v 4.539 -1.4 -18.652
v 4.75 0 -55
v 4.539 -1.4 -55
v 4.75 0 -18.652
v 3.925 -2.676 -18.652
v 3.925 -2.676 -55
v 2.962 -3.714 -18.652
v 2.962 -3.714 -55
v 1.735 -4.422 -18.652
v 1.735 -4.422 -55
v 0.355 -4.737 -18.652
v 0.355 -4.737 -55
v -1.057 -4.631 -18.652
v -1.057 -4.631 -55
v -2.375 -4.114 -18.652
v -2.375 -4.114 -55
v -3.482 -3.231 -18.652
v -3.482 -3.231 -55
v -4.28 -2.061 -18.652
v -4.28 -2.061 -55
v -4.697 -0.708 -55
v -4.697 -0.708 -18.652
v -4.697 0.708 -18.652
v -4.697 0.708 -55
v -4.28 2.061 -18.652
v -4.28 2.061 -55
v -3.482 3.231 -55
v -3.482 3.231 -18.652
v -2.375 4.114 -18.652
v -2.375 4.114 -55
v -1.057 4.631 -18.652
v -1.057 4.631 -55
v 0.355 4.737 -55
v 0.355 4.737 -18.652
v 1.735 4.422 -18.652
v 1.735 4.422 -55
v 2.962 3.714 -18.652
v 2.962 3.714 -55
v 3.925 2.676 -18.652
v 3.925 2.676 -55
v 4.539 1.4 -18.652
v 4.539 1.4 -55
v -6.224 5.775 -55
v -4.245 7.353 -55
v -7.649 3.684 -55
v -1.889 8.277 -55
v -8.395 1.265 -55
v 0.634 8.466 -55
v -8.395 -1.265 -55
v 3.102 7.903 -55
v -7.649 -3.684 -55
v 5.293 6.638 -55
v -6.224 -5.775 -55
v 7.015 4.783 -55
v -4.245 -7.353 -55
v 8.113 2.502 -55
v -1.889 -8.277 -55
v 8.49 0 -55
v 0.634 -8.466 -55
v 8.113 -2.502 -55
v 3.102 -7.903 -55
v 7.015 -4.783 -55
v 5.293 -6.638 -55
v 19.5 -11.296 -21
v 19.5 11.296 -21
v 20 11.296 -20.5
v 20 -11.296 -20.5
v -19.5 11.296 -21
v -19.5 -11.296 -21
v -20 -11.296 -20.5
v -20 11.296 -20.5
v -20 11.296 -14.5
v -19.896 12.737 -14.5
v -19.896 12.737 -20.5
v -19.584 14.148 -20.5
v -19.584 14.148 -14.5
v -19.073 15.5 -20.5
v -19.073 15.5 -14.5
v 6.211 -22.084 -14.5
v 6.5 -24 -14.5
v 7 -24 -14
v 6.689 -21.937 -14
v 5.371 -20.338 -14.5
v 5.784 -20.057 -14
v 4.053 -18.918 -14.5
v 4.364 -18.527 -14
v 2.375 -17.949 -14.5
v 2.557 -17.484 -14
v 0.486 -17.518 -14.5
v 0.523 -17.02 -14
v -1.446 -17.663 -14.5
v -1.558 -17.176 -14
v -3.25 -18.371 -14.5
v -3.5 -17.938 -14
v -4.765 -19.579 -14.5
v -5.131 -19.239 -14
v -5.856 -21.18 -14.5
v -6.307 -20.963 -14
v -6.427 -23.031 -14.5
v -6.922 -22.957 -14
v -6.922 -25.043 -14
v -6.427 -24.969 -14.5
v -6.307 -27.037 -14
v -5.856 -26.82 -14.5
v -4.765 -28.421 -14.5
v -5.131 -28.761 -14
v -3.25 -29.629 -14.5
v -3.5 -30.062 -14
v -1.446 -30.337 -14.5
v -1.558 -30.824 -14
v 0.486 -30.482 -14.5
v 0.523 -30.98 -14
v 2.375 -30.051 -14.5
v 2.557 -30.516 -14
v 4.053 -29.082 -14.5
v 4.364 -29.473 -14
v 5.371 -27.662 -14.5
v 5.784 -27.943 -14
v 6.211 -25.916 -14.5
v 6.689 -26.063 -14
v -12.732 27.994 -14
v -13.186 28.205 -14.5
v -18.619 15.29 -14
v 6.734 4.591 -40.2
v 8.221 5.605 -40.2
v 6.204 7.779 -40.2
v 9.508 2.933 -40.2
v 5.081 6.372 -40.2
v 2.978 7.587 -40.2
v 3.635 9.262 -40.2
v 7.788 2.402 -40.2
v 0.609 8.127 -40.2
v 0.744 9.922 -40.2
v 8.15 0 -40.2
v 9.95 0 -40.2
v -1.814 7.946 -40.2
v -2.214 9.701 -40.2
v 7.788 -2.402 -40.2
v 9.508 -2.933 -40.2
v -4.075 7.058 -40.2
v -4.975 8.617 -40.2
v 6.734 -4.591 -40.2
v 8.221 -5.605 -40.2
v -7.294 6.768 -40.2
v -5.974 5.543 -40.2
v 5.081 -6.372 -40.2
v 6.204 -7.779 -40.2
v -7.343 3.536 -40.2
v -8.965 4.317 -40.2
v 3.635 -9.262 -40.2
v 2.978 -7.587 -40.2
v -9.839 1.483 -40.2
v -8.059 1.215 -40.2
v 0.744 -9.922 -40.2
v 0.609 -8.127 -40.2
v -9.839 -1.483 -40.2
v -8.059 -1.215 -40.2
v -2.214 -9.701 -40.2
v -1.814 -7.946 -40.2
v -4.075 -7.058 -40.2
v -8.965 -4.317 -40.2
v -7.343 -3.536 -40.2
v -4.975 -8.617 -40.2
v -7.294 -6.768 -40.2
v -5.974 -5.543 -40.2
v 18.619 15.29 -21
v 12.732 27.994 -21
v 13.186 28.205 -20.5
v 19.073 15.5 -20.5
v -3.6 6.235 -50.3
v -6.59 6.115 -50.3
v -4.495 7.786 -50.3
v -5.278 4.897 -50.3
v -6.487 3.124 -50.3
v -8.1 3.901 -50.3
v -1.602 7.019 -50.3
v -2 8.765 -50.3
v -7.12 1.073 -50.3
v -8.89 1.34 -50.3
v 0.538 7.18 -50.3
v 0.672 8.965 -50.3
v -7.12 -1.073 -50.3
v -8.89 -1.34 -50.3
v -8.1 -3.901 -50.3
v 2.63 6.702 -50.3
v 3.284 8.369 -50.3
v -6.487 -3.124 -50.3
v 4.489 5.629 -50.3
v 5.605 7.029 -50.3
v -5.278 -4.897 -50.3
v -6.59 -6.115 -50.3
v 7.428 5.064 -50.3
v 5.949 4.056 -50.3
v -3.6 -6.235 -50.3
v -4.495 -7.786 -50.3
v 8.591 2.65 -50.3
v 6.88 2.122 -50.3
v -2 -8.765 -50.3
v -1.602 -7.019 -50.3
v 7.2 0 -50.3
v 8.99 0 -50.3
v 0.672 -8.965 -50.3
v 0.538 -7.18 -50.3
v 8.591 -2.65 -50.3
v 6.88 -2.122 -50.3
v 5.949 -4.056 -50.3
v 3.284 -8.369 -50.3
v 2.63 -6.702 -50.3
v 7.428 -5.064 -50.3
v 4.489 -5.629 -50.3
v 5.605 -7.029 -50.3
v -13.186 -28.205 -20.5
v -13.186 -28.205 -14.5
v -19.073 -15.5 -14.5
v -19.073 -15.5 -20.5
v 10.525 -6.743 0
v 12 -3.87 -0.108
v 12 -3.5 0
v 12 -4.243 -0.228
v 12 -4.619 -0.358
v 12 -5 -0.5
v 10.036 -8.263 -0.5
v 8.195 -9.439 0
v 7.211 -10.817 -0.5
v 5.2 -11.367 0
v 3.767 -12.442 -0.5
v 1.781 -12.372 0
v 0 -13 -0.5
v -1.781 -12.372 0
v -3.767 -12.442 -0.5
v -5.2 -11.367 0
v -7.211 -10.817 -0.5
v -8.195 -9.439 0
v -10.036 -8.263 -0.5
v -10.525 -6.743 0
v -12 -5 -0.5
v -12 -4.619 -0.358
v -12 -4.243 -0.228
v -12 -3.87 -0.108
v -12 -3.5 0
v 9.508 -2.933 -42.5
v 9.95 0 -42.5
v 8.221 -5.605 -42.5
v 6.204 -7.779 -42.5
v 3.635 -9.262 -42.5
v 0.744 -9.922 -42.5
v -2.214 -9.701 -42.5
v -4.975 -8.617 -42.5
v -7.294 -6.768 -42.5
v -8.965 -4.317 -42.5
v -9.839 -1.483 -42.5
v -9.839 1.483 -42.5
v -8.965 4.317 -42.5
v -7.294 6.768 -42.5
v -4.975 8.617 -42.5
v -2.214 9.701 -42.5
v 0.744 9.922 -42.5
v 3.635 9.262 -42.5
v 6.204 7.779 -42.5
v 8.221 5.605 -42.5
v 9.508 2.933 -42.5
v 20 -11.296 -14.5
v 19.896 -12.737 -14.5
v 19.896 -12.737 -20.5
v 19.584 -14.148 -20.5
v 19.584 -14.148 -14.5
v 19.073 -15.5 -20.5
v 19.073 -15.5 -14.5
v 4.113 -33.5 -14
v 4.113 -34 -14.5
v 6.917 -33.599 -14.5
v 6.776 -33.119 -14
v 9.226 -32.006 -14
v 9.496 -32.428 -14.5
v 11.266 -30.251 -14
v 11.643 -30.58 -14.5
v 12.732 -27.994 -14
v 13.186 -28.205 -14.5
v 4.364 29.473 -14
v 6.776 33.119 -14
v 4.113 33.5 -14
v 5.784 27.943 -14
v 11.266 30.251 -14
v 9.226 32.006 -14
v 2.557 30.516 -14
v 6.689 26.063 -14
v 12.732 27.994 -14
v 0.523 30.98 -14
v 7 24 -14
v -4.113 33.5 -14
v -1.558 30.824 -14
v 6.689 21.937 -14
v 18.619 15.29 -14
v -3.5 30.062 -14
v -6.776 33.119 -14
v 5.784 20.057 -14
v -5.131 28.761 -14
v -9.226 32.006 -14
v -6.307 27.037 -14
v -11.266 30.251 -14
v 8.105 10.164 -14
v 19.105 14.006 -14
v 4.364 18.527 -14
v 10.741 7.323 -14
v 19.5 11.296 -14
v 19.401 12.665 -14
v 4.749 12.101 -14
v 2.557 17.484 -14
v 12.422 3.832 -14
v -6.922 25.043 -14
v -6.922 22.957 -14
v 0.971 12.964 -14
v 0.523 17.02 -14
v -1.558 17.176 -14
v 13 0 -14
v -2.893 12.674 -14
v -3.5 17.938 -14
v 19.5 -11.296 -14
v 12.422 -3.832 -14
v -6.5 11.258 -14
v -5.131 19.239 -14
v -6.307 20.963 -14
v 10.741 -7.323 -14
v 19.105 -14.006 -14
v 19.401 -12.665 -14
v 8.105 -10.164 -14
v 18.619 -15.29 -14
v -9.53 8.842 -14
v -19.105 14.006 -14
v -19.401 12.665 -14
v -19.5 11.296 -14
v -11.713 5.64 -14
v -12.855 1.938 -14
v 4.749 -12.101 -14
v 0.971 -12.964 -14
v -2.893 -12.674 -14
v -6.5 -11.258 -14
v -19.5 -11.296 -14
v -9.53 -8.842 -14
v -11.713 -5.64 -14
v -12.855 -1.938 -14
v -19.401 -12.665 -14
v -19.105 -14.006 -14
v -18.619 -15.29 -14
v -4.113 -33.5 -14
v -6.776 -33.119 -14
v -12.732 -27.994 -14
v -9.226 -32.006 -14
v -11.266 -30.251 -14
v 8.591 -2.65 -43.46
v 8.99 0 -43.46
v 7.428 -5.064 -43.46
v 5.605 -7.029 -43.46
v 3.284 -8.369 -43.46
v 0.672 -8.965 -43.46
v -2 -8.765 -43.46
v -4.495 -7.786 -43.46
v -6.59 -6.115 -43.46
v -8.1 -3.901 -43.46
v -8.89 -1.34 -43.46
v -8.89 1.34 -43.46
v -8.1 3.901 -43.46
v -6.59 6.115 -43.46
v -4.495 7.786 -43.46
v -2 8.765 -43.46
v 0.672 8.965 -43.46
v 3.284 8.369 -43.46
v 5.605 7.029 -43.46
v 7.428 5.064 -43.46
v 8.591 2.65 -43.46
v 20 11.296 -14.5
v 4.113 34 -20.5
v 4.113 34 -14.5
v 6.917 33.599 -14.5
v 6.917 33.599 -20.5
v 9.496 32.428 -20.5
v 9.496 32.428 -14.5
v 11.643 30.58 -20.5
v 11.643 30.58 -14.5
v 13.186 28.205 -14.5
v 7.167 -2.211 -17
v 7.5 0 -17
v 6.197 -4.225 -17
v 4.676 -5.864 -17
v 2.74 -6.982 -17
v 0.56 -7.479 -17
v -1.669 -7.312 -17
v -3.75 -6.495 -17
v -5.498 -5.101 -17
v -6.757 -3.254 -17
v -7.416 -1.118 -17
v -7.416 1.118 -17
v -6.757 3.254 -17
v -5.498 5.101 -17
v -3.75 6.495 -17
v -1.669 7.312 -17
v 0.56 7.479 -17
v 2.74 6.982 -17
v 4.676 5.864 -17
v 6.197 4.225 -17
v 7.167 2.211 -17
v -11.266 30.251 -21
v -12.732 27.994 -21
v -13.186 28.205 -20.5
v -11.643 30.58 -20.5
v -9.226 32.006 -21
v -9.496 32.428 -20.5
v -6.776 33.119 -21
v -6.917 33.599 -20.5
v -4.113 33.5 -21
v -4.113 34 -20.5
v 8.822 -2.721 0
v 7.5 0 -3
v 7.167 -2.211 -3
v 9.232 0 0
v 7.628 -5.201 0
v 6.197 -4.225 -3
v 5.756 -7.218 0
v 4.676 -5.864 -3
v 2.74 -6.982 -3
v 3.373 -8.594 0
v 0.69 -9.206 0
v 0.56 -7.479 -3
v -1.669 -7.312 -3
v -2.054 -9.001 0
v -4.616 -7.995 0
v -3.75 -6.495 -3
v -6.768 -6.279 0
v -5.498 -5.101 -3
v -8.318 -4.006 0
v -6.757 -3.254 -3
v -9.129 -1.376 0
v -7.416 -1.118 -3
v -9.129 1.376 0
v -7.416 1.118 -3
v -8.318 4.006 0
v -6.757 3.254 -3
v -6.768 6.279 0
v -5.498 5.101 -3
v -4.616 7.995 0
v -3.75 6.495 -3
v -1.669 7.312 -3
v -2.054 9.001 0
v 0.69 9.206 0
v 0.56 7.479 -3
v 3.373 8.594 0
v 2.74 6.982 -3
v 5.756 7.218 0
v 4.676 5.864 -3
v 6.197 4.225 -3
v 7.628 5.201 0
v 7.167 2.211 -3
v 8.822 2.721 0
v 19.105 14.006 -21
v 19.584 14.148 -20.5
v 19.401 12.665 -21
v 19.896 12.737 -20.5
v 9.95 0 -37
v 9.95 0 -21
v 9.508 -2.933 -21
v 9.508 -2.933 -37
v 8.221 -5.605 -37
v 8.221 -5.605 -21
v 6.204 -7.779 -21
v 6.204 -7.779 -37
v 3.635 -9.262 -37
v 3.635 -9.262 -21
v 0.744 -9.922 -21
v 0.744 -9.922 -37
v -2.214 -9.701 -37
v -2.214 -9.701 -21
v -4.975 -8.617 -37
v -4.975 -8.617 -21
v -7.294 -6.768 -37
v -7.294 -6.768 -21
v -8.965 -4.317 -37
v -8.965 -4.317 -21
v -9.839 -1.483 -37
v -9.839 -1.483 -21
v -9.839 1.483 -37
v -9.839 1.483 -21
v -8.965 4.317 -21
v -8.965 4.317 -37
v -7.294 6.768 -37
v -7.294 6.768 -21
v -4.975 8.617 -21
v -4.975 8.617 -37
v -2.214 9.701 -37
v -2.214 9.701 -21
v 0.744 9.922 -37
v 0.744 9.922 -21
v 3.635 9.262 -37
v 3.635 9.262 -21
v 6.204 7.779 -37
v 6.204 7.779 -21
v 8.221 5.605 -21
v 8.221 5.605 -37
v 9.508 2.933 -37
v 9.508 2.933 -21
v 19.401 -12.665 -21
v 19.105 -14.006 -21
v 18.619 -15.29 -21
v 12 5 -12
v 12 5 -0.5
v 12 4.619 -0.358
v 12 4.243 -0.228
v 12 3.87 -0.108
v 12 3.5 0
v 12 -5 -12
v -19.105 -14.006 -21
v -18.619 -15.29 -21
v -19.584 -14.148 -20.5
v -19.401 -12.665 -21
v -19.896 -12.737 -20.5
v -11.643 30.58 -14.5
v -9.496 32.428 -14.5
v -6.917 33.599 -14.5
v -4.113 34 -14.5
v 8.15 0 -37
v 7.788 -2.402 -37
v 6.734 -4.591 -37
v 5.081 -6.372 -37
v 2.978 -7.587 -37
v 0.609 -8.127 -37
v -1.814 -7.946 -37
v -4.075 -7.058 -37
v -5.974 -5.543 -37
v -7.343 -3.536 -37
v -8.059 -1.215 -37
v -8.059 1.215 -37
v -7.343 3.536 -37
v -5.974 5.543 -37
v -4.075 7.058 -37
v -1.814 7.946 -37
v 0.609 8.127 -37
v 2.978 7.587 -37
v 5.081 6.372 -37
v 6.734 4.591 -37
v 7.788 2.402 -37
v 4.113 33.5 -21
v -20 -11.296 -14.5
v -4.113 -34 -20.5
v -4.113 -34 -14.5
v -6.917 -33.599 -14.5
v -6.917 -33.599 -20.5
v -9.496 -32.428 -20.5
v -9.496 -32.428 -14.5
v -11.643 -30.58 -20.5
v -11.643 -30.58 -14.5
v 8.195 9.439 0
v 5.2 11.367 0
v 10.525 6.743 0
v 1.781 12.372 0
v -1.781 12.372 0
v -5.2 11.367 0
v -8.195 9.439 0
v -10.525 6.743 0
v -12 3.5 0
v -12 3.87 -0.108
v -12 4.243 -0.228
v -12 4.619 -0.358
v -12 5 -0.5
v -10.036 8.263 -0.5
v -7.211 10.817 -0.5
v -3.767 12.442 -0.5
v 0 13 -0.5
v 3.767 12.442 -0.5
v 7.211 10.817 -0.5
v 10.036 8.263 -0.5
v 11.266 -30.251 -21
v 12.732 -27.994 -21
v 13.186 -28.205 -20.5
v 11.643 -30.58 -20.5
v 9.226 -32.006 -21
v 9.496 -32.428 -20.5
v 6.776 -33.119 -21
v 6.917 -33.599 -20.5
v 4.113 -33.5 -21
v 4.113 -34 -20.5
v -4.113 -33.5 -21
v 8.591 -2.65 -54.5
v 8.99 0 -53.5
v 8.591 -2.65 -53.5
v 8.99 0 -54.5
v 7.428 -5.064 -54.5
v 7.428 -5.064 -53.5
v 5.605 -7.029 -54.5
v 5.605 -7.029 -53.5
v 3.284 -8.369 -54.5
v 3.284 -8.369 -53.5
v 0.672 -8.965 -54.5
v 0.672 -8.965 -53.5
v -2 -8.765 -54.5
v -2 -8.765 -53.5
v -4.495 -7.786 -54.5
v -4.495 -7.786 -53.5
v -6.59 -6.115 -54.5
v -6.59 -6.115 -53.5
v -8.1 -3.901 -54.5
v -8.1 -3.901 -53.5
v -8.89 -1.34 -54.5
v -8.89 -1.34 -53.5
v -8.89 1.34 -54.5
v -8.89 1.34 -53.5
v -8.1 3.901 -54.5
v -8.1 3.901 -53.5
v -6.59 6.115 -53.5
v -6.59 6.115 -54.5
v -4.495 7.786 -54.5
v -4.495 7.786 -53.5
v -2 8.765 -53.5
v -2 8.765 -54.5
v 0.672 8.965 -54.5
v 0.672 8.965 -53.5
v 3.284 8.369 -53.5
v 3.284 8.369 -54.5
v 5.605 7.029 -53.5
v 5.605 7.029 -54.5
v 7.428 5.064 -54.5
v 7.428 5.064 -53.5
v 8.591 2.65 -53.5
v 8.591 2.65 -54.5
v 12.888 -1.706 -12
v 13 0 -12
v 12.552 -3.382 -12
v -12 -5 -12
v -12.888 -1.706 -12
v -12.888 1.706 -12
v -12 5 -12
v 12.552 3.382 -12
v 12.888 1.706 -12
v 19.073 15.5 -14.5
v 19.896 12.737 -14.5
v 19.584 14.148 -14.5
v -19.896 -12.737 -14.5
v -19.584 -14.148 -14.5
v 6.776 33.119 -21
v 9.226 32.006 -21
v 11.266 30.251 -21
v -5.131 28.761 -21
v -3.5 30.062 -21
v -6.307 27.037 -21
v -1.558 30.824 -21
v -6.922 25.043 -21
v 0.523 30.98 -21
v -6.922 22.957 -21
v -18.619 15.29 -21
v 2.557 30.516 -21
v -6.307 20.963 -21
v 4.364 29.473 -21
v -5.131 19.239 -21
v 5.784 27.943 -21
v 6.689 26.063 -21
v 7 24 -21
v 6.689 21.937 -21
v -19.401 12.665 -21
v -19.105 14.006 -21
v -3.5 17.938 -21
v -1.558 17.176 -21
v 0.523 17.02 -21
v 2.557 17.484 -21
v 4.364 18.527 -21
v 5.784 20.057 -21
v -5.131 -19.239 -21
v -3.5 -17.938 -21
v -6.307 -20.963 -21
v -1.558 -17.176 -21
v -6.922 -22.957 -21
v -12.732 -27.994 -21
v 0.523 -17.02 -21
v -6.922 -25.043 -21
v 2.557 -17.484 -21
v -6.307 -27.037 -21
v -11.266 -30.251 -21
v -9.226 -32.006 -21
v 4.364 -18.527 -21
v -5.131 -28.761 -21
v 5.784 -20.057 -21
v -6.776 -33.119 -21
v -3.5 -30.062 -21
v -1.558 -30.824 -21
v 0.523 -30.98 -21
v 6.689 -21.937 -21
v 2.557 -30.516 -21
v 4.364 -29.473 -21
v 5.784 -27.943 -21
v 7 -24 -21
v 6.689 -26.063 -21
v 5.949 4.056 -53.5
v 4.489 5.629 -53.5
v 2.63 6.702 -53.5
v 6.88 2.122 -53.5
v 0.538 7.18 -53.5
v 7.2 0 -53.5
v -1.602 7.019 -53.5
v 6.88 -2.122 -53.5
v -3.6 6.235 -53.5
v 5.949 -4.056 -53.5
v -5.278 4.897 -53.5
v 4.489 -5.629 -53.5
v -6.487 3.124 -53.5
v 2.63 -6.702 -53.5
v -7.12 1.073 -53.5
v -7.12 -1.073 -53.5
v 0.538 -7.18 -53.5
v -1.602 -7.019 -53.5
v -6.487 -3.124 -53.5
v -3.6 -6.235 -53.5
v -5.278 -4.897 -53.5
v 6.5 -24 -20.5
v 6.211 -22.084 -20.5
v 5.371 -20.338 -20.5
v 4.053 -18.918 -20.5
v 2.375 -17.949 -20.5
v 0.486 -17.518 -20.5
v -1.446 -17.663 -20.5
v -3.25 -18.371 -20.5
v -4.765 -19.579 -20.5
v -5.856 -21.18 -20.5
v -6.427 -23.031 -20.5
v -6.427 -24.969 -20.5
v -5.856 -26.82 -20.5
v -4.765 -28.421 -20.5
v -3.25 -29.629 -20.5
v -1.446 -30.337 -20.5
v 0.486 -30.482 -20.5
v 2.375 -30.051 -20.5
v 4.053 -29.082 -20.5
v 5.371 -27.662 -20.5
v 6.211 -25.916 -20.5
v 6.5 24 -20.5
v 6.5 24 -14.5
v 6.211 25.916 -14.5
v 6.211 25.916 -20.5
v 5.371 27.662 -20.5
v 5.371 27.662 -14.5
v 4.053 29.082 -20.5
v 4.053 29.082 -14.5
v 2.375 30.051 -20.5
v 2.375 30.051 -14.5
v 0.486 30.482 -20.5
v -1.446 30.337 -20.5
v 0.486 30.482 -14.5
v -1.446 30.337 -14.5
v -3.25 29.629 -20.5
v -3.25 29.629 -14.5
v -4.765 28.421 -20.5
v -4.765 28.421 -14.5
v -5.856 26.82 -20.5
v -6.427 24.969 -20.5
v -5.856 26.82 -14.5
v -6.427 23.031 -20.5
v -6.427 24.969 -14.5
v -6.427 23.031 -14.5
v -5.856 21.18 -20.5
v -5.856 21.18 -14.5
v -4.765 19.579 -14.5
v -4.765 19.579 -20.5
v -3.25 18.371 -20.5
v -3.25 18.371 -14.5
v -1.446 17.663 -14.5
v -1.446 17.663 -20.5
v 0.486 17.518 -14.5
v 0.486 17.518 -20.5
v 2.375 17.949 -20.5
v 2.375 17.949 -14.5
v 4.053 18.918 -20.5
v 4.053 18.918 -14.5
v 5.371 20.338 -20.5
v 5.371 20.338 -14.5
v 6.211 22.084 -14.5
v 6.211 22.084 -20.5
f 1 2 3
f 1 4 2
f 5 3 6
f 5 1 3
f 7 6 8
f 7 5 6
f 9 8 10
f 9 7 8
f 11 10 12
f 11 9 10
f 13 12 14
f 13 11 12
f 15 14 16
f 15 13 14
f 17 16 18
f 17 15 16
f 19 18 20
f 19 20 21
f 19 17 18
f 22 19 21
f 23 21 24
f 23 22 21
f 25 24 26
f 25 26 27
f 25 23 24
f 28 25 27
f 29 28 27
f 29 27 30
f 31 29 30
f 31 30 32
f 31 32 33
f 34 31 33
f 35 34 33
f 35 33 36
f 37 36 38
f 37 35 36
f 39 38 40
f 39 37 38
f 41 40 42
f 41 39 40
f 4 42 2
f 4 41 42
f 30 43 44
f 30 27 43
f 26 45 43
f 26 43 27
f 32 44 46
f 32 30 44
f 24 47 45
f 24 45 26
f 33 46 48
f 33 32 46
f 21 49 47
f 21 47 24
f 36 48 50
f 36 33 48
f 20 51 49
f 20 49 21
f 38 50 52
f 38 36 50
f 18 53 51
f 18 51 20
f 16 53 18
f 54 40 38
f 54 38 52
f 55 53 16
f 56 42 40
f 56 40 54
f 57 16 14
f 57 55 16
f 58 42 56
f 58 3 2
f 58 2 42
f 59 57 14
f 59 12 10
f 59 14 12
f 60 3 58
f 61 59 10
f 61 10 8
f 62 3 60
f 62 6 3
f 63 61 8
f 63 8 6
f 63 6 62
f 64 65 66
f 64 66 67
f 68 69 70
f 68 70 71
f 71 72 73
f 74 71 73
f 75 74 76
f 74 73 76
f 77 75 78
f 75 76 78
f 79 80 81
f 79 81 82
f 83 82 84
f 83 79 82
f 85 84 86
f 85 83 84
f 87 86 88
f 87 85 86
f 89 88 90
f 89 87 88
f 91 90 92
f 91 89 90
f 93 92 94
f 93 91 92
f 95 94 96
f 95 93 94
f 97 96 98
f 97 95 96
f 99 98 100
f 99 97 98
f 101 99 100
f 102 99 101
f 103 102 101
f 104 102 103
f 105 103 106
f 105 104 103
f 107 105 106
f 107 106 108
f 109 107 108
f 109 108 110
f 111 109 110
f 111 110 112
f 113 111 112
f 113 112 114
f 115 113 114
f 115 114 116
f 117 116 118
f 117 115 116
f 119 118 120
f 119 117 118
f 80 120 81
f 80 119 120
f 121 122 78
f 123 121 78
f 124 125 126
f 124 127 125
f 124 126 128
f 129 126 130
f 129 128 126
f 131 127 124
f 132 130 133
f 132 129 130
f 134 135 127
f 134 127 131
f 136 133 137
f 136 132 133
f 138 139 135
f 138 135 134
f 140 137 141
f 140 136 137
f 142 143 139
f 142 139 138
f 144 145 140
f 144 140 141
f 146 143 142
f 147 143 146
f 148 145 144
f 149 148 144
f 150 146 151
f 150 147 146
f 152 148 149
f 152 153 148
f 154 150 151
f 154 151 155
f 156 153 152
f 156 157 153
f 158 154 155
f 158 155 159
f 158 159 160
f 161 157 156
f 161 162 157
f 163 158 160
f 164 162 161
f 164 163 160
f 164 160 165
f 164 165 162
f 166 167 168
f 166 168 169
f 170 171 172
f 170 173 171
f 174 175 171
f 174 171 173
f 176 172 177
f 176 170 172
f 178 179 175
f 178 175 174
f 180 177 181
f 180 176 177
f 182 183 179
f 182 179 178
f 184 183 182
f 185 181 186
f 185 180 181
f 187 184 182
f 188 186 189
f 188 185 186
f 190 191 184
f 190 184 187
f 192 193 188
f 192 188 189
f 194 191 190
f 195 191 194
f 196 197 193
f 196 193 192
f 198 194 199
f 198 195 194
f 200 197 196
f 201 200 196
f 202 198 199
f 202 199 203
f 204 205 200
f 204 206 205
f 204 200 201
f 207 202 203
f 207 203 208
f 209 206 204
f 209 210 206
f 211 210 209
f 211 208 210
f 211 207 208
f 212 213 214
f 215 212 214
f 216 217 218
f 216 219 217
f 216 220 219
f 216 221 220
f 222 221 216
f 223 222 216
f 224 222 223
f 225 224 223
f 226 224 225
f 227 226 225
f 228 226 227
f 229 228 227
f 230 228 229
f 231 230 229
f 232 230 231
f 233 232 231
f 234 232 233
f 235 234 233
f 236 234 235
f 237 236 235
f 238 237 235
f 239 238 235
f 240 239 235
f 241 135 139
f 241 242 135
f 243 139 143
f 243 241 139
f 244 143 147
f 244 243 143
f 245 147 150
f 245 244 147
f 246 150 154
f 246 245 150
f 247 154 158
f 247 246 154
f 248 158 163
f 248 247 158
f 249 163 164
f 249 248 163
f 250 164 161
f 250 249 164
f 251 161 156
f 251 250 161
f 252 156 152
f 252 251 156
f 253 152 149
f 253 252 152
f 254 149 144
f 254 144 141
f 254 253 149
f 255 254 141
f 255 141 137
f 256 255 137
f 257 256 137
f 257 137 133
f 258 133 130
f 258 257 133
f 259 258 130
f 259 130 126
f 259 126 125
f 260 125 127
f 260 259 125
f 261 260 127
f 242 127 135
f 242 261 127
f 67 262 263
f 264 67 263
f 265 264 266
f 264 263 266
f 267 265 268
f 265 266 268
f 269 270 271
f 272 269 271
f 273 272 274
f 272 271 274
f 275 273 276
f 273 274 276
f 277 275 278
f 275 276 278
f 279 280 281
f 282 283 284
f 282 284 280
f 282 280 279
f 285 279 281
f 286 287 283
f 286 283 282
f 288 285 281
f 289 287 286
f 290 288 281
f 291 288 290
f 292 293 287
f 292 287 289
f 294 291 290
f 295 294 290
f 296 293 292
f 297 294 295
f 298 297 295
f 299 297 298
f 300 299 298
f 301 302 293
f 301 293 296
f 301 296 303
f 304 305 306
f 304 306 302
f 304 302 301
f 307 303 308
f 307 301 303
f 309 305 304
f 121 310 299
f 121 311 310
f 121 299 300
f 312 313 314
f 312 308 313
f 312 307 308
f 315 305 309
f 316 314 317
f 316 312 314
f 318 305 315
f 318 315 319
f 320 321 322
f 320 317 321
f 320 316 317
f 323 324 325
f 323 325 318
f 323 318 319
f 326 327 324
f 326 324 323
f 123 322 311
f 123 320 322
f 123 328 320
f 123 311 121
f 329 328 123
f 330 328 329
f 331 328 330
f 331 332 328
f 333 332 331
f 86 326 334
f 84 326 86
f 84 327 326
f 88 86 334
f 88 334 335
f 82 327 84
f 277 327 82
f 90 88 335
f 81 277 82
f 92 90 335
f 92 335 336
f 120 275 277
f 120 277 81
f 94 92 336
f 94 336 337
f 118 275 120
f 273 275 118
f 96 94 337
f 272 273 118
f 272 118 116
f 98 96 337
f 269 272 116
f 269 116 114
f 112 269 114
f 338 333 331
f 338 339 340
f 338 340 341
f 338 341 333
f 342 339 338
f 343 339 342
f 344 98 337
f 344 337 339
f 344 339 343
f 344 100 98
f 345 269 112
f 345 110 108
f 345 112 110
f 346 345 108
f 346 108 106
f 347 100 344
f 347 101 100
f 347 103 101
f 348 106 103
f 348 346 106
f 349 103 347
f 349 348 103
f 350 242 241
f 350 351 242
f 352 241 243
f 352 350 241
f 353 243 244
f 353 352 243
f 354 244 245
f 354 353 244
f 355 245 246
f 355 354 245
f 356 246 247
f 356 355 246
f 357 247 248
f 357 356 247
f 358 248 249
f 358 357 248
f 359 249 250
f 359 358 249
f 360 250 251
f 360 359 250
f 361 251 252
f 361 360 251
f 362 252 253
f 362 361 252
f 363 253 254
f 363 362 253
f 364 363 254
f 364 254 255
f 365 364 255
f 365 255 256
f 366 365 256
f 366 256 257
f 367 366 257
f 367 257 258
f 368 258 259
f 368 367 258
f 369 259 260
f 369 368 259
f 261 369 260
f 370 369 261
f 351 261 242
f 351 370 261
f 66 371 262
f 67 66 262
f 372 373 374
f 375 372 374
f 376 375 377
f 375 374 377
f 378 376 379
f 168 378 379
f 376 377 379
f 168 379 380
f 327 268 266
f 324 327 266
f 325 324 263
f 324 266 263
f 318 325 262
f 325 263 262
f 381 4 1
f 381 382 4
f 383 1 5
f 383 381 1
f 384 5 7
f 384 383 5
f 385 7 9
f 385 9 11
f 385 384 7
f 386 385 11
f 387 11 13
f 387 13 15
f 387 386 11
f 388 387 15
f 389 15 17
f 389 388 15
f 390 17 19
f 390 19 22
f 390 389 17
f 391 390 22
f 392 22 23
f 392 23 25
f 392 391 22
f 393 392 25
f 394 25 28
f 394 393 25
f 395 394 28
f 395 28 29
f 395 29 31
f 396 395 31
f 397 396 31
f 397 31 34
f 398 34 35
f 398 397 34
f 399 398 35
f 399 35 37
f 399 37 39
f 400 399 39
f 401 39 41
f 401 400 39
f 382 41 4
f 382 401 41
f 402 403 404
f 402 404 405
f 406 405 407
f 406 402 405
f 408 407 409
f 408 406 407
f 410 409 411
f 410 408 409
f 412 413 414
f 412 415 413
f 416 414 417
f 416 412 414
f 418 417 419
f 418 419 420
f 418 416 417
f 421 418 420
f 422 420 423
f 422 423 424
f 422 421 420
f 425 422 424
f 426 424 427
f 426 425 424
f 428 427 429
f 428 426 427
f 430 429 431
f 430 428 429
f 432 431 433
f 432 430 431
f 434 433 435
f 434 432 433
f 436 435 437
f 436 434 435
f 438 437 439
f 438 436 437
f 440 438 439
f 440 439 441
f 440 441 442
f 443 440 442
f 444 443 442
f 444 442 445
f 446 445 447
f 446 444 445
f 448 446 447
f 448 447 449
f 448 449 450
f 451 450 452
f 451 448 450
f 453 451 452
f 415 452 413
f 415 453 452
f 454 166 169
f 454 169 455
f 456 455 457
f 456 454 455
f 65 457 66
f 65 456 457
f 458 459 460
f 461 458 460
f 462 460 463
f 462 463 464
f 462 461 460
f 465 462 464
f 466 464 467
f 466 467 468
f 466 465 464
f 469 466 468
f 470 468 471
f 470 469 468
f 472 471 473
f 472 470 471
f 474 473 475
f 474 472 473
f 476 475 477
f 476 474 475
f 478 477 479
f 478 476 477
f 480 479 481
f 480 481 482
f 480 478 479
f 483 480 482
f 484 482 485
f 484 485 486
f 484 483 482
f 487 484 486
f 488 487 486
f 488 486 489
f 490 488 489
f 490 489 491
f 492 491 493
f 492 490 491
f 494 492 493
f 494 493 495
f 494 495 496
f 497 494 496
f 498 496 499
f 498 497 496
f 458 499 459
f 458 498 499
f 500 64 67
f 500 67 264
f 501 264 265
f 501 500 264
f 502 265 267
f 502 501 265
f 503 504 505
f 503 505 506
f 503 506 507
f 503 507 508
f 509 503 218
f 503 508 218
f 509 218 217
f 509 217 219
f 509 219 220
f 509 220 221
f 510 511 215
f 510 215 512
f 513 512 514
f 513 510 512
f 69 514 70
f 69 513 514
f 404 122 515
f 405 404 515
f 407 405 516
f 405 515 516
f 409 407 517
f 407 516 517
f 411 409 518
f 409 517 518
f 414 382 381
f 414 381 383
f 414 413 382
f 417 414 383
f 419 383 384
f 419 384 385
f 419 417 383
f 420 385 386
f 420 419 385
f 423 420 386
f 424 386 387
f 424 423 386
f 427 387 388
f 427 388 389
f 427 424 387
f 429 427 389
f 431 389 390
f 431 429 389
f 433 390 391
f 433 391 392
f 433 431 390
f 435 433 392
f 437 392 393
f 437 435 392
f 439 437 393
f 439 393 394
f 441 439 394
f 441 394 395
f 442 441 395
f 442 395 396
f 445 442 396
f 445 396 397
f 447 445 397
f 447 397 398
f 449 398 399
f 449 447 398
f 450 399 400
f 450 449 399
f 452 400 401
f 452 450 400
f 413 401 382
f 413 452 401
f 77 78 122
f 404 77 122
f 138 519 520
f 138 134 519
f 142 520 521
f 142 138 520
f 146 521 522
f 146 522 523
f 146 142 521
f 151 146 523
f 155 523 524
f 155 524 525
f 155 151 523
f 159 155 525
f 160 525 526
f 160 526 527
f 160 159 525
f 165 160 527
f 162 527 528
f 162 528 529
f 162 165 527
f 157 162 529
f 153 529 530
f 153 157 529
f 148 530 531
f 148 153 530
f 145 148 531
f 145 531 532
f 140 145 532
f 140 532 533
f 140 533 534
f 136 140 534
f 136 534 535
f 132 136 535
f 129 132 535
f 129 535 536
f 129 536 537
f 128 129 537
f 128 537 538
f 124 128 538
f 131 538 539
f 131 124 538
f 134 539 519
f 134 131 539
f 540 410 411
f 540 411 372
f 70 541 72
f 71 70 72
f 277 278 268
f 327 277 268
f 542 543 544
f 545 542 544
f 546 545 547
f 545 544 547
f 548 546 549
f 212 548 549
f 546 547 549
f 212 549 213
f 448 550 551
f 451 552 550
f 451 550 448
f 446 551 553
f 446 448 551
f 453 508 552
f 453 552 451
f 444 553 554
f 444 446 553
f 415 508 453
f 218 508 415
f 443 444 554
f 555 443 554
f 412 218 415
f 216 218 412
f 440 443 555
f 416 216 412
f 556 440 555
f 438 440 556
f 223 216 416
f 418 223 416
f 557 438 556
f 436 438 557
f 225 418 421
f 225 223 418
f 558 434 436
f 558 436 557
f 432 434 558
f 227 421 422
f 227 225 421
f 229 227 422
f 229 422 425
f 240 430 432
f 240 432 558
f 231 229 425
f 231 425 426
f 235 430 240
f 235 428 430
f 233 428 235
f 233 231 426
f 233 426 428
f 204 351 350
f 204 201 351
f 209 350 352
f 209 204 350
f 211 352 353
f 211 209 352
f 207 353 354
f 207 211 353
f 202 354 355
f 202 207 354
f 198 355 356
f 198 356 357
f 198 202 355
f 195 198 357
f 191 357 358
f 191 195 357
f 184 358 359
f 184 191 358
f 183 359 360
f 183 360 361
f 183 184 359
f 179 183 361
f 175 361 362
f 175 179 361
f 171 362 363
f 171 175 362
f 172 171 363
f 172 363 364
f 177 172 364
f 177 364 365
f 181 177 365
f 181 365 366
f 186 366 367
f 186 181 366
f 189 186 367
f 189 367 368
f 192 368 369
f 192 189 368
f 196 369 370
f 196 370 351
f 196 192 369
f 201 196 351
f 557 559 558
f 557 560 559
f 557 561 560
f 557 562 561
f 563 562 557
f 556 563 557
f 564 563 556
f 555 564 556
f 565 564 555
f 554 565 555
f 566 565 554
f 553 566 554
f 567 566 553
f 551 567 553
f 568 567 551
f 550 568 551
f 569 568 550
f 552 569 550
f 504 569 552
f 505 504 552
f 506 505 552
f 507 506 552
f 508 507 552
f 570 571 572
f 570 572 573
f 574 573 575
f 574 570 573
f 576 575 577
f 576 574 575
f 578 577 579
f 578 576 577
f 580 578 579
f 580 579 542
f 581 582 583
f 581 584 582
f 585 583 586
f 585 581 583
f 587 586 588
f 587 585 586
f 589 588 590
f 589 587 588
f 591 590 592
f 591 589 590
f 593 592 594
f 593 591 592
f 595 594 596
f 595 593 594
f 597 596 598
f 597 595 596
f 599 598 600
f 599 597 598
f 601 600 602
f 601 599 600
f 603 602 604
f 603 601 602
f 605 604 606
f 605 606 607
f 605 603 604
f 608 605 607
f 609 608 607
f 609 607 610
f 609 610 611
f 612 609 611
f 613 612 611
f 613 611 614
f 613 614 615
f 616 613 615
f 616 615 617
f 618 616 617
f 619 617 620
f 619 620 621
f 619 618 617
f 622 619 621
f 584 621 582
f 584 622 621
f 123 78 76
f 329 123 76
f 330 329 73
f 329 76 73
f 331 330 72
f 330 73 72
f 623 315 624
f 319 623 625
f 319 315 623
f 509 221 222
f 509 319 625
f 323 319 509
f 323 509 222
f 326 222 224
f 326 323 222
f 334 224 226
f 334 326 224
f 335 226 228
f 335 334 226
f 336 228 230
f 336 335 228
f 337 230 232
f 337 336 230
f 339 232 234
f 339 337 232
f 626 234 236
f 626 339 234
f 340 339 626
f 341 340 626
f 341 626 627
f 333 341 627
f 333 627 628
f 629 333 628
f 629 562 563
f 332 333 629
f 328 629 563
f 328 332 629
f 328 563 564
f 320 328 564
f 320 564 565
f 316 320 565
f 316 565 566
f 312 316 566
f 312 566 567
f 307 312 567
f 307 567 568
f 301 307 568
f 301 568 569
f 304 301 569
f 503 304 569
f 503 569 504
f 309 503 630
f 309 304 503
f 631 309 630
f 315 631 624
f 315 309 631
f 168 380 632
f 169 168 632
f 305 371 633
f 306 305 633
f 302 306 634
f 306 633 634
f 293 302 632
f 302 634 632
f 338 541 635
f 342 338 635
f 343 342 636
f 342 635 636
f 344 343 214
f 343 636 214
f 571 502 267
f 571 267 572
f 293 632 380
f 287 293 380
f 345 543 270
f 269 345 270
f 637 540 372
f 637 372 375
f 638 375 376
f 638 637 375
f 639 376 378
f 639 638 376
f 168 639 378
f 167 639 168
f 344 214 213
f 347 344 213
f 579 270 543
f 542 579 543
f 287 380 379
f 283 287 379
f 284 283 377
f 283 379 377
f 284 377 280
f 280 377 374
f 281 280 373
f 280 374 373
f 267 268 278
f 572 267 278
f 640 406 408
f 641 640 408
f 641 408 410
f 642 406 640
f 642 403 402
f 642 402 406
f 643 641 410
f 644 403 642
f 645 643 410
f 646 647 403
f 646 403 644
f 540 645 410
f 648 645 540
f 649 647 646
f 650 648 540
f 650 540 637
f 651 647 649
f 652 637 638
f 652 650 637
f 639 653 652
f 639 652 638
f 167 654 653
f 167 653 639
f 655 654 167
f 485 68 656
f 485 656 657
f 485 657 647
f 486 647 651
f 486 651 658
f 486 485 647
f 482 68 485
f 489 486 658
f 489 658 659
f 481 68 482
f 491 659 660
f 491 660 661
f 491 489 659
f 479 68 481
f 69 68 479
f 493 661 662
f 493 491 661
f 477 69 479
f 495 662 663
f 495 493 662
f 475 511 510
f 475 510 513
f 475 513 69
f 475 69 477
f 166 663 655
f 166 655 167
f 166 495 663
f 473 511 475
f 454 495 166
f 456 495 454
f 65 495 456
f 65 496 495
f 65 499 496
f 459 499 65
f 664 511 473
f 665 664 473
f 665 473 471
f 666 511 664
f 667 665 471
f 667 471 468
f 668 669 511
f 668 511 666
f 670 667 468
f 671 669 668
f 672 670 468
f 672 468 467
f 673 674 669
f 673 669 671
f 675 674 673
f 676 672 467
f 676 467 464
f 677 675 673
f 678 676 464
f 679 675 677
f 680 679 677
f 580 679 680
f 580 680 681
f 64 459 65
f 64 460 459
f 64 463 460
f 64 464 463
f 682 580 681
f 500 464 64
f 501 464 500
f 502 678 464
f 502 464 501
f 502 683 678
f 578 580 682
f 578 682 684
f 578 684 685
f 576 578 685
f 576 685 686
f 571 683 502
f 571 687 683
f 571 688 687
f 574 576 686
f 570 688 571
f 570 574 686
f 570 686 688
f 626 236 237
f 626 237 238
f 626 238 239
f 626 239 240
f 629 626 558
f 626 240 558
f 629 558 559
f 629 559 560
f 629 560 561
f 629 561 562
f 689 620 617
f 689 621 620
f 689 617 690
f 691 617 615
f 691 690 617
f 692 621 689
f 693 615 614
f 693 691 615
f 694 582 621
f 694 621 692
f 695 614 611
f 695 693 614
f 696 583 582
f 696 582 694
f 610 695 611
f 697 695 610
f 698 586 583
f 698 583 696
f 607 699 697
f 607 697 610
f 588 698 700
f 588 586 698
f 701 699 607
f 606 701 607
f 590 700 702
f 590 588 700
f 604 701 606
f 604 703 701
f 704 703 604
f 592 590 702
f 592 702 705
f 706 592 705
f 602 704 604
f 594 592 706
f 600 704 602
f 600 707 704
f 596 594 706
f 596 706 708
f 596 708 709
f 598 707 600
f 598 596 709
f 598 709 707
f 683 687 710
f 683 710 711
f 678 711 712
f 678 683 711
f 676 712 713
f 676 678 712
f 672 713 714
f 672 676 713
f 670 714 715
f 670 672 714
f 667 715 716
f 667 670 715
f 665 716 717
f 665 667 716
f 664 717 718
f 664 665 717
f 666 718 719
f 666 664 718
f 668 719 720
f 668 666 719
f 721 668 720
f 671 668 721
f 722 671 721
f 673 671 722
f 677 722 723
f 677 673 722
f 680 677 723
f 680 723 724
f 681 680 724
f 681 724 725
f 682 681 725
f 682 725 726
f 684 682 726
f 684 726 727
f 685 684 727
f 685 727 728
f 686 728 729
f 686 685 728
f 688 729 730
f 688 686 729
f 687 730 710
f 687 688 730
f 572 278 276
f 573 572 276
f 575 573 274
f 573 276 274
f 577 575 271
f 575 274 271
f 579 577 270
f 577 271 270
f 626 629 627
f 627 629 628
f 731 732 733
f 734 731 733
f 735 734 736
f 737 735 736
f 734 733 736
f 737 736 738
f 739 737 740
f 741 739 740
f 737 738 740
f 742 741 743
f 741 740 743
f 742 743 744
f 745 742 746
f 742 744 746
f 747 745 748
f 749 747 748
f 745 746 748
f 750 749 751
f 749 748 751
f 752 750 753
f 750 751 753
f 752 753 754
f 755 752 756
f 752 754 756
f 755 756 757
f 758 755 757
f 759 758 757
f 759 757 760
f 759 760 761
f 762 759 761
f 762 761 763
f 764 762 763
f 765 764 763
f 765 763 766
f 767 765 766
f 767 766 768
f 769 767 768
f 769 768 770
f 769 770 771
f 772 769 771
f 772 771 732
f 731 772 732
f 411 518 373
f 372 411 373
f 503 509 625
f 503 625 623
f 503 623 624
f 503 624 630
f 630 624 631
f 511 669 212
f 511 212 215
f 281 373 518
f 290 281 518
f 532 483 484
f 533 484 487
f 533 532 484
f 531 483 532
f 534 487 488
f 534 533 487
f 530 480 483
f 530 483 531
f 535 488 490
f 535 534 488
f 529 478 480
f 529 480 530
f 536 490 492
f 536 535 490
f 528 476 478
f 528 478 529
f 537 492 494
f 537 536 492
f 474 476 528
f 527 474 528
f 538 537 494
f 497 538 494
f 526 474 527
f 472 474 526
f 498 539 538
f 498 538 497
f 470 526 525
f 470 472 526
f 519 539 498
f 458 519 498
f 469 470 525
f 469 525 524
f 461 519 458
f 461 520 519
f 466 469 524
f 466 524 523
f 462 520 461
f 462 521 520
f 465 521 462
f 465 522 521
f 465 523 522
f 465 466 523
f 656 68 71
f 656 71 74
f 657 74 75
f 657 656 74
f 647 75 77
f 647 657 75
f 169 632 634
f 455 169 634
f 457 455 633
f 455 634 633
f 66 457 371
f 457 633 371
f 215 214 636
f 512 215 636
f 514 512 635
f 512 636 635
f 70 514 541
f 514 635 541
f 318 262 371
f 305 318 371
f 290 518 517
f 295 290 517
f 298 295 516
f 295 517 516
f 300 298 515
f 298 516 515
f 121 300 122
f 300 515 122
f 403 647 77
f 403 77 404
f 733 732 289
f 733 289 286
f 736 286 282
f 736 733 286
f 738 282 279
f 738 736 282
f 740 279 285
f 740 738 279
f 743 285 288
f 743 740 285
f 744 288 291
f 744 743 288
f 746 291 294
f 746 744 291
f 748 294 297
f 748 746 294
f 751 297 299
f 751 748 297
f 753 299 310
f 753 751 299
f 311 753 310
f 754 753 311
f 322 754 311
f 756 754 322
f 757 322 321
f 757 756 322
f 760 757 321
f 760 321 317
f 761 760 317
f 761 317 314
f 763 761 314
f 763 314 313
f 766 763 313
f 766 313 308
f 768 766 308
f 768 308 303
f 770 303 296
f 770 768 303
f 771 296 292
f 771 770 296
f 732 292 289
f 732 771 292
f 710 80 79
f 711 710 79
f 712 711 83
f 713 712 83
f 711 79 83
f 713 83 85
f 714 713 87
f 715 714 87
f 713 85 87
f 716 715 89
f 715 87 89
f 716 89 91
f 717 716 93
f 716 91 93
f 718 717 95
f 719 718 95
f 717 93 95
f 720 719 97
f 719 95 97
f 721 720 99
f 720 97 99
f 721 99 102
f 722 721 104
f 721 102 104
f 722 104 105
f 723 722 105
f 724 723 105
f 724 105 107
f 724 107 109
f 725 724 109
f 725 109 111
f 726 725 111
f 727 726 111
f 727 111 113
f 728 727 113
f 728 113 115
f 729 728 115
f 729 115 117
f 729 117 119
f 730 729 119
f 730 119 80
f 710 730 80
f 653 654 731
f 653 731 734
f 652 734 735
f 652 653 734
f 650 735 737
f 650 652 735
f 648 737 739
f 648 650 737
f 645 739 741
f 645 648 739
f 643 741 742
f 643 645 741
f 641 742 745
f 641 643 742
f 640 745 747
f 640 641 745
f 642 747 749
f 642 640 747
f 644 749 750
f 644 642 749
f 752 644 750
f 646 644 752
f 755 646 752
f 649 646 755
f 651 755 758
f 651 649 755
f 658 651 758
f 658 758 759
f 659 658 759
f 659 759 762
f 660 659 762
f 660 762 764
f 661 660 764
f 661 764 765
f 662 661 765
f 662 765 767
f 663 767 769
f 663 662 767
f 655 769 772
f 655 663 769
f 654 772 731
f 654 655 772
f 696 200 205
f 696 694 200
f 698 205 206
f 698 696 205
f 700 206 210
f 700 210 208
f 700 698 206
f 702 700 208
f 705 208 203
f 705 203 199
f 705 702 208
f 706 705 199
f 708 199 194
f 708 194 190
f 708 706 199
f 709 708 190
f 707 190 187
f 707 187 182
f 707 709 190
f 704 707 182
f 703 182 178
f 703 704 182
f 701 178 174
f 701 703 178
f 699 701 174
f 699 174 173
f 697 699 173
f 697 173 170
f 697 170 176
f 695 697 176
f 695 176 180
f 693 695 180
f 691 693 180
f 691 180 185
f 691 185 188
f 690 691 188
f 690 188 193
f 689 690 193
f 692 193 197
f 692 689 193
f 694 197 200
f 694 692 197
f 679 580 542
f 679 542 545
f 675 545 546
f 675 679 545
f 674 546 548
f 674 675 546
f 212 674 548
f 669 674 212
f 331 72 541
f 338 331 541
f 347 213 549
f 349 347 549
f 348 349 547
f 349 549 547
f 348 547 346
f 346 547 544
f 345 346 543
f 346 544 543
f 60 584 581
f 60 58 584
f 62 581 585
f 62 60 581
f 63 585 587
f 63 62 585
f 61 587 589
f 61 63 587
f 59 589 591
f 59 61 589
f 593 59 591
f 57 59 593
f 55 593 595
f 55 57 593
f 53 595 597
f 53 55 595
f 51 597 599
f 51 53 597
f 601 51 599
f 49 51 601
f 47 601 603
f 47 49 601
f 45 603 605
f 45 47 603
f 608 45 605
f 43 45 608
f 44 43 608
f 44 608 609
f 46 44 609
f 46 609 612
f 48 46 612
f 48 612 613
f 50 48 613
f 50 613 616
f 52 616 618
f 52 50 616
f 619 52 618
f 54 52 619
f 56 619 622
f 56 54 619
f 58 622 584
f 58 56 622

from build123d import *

# Parameters (mm, degrees)
SKETCH2_OUTSIDE_W  = 94.65
SKETCH2_OUTSIDE_H  = 94.65
SKETCH2_OUTSIDE_R  = 6.5
CUT_EXTRUDE1_DEPTH = 21
SKETCH5_W          = 2.091476768
SKETCH5_H          = 18
CUT_EXTRUDE2_DEPTH = 12
CIRPATTERN1_COUNT  = 2
CIRPATTERN1_ANGLE  = 180
CHAMFER1_SIZE      = 0.5


with BuildPart() as part:
    # Sketch1 → Revolve1 (revolve)
    with BuildSketch(Plane(origin=(0, 0, 0), x_dir=(0, 0, -1), z_dir=(1, 0, 0)), mode=Mode.PRIVATE) as revolve1_sk:
        Polygon((14, 35), (21, 35), (21, 9.95), (37, 9.95), (37, 8.15), (40.2, 8.15), (40.2, 9.95), (42.5, 9.95), (43.46, 8.99), (50.3, 8.99), (50.3, 7.2), (53.5, 7.2), (53.5, 8.99), (54.5, 8.99), (55, 8.49), (55, 4.75), (18.652366702, 4.75), (17, 7.5), (3, 7.5), (0, 9.232050808), (0, 12.5), (0.5, 13), (14, 13), align=None)
    revolve(revolve1_sk.sketch.rotate(Axis((0, 0, 0), (0, 0, -1)), 90), axis=Axis((0, 0, 0), (0, 0, -1)))

    # Sketch2 outside → Cut-Extrude1 (cut)
    # profile 1 of 3: a face of its own
    with BuildSketch(Plane.XY):
        Rectangle(SKETCH2_OUTSIDE_W, SKETCH2_OUTSIDE_H)
        with BuildLine():
            Line((-4.112562412, 34), (4.112562412, 34))
            ThreePointArc((4.112562412, 34), (9.495586596, 32.427517466), (13.185668477, 28.204610128))
            Line((13.185668477, 28.204610128), (19.073106065, 15.500139543))
            ThreePointArc((19.073106065, 15.500139543), (19.765527652, 13.448311261), (20, 11.295529415))
            Line((20, 11.295529415), (20, -11.295529415))
            ThreePointArc((20, -11.295529415), (19.765527652, -13.448311261), (19.073106065, -15.500139543))
            Line((19.073106065, -15.500139543), (13.185668477, -28.204610128))
            ThreePointArc((13.185668477, -28.204610128), (9.495586596, -32.427517466), (4.112562412, -34))
            Line((4.112562412, -34), (-4.112562412, -34))
            ThreePointArc((-4.112562412, -34), (-9.495586596, -32.427517466), (-13.185668477, -28.204610128))
            Line((-13.185668477, -28.204610128), (-19.073106065, -15.500139543))
            ThreePointArc((-19.073106065, -15.500139543), (-19.765527652, -13.448311261), (-20, -11.295529415))
            Line((-20, -11.295529415), (-20, 11.295529415))
            ThreePointArc((-20, 11.295529415), (-19.765527652, 13.448311261), (-19.073106065, 15.500139543))
            Line((-19.073106065, 15.500139543), (-13.185668477, 28.204610128))
            ThreePointArc((-13.185668477, 28.204610128), (-9.495586596, 32.427517466), (-4.112562412, 34))
        make_face(mode=Mode.SUBTRACT)
    # profile 2 of 3: a face of its own
    with BuildSketch(Plane.XY):
        with Locations((0, 24)):
            Circle(SKETCH2_OUTSIDE_R)
    # profile 3 of 3: a face of its own
    with BuildSketch(Plane.XY):
        with Locations((0, -24)):
            Circle(SKETCH2_OUTSIDE_R)
    extrude(amount=-CUT_EXTRUDE1_DEPTH, mode=Mode.SUBTRACT)

    # Sketch5 → Cut-Extrude2 (cut)
    with BuildSketch(Plane.XY):
        with Locations((-13.045738384, -0.152764218)):
            Rectangle(SKETCH5_W, SKETCH5_H)
    cut_extrude2 = extrude(amount=-CUT_EXTRUDE2_DEPTH, mode=Mode.SUBTRACT)

    # CirPattern1: Cut-Extrude2 ×2 about axis
    cirpattern1_axis = Axis((0, 0, 0), (0, 0, 1))
    for i in range(1, CIRPATTERN1_COUNT):
        add(cut_extrude2.rotate(cirpattern1_axis, i * CIRPATTERN1_ANGLE / (CIRPATTERN1_COUNT - 1)), mode=Mode.SUBTRACT)

    # Chamfer1
    chamfer1_edges = [part.edges().sort_by_distance(p)[0] for p in [
        (-6.5, 24, -21),
        (-6.5, 24, -14),
        (-6.5, -24, -21),
        (-6.5, -24, -14),
        (20, 0, -21),
        (19.765527652, 13.448311261, -21),
        (16.129387271, 21.852374836, -21),
        (9.495586596, 32.427517466, -21),
        (0, 34, -21),
        (-9.495586596, 32.427517466, -21),
        (-16.129387271, 21.852374836, -21),
        (-19.765527652, 13.448311261, -21),
        (-20, 0, -21),
        (-19.765527652, -13.448311261, -21),
        (-16.129387271, -21.852374836, -21),
        (-9.495586596, -32.427517466, -21),
        (0, -34, -21),
        (9.495586596, -32.427517466, -21),
        (16.129387271, -21.852374836, -21),
        (19.765527652, -13.448311261, -21),
        (19.765527652, 13.448311261, -14),
        (20, 0, -14),
        (19.765527652, -13.448311261, -14),
        (16.129387271, -21.852374836, -14),
        (9.495586596, -32.427517466, -14),
        (0, -34, -14),
        (-9.495586596, -32.427517466, -14),
        (-16.129387271, -21.852374836, -14),
        (-19.765527652, -13.448311261, -14),
        (-20, 0, -14),
        (-19.765527652, 13.448311261, -14),
        (-16.129387271, 21.852374836, -14),
        (-9.495586596, 32.427517466, -14),
        (0, 34, -14),
        (9.495586596, 32.427517466, -14),
        (16.129387271, 21.852374836, -14),
    ]]
    chamfer(chamfer1_edges, length=CHAMFER1_SIZE)


solid = part.part
